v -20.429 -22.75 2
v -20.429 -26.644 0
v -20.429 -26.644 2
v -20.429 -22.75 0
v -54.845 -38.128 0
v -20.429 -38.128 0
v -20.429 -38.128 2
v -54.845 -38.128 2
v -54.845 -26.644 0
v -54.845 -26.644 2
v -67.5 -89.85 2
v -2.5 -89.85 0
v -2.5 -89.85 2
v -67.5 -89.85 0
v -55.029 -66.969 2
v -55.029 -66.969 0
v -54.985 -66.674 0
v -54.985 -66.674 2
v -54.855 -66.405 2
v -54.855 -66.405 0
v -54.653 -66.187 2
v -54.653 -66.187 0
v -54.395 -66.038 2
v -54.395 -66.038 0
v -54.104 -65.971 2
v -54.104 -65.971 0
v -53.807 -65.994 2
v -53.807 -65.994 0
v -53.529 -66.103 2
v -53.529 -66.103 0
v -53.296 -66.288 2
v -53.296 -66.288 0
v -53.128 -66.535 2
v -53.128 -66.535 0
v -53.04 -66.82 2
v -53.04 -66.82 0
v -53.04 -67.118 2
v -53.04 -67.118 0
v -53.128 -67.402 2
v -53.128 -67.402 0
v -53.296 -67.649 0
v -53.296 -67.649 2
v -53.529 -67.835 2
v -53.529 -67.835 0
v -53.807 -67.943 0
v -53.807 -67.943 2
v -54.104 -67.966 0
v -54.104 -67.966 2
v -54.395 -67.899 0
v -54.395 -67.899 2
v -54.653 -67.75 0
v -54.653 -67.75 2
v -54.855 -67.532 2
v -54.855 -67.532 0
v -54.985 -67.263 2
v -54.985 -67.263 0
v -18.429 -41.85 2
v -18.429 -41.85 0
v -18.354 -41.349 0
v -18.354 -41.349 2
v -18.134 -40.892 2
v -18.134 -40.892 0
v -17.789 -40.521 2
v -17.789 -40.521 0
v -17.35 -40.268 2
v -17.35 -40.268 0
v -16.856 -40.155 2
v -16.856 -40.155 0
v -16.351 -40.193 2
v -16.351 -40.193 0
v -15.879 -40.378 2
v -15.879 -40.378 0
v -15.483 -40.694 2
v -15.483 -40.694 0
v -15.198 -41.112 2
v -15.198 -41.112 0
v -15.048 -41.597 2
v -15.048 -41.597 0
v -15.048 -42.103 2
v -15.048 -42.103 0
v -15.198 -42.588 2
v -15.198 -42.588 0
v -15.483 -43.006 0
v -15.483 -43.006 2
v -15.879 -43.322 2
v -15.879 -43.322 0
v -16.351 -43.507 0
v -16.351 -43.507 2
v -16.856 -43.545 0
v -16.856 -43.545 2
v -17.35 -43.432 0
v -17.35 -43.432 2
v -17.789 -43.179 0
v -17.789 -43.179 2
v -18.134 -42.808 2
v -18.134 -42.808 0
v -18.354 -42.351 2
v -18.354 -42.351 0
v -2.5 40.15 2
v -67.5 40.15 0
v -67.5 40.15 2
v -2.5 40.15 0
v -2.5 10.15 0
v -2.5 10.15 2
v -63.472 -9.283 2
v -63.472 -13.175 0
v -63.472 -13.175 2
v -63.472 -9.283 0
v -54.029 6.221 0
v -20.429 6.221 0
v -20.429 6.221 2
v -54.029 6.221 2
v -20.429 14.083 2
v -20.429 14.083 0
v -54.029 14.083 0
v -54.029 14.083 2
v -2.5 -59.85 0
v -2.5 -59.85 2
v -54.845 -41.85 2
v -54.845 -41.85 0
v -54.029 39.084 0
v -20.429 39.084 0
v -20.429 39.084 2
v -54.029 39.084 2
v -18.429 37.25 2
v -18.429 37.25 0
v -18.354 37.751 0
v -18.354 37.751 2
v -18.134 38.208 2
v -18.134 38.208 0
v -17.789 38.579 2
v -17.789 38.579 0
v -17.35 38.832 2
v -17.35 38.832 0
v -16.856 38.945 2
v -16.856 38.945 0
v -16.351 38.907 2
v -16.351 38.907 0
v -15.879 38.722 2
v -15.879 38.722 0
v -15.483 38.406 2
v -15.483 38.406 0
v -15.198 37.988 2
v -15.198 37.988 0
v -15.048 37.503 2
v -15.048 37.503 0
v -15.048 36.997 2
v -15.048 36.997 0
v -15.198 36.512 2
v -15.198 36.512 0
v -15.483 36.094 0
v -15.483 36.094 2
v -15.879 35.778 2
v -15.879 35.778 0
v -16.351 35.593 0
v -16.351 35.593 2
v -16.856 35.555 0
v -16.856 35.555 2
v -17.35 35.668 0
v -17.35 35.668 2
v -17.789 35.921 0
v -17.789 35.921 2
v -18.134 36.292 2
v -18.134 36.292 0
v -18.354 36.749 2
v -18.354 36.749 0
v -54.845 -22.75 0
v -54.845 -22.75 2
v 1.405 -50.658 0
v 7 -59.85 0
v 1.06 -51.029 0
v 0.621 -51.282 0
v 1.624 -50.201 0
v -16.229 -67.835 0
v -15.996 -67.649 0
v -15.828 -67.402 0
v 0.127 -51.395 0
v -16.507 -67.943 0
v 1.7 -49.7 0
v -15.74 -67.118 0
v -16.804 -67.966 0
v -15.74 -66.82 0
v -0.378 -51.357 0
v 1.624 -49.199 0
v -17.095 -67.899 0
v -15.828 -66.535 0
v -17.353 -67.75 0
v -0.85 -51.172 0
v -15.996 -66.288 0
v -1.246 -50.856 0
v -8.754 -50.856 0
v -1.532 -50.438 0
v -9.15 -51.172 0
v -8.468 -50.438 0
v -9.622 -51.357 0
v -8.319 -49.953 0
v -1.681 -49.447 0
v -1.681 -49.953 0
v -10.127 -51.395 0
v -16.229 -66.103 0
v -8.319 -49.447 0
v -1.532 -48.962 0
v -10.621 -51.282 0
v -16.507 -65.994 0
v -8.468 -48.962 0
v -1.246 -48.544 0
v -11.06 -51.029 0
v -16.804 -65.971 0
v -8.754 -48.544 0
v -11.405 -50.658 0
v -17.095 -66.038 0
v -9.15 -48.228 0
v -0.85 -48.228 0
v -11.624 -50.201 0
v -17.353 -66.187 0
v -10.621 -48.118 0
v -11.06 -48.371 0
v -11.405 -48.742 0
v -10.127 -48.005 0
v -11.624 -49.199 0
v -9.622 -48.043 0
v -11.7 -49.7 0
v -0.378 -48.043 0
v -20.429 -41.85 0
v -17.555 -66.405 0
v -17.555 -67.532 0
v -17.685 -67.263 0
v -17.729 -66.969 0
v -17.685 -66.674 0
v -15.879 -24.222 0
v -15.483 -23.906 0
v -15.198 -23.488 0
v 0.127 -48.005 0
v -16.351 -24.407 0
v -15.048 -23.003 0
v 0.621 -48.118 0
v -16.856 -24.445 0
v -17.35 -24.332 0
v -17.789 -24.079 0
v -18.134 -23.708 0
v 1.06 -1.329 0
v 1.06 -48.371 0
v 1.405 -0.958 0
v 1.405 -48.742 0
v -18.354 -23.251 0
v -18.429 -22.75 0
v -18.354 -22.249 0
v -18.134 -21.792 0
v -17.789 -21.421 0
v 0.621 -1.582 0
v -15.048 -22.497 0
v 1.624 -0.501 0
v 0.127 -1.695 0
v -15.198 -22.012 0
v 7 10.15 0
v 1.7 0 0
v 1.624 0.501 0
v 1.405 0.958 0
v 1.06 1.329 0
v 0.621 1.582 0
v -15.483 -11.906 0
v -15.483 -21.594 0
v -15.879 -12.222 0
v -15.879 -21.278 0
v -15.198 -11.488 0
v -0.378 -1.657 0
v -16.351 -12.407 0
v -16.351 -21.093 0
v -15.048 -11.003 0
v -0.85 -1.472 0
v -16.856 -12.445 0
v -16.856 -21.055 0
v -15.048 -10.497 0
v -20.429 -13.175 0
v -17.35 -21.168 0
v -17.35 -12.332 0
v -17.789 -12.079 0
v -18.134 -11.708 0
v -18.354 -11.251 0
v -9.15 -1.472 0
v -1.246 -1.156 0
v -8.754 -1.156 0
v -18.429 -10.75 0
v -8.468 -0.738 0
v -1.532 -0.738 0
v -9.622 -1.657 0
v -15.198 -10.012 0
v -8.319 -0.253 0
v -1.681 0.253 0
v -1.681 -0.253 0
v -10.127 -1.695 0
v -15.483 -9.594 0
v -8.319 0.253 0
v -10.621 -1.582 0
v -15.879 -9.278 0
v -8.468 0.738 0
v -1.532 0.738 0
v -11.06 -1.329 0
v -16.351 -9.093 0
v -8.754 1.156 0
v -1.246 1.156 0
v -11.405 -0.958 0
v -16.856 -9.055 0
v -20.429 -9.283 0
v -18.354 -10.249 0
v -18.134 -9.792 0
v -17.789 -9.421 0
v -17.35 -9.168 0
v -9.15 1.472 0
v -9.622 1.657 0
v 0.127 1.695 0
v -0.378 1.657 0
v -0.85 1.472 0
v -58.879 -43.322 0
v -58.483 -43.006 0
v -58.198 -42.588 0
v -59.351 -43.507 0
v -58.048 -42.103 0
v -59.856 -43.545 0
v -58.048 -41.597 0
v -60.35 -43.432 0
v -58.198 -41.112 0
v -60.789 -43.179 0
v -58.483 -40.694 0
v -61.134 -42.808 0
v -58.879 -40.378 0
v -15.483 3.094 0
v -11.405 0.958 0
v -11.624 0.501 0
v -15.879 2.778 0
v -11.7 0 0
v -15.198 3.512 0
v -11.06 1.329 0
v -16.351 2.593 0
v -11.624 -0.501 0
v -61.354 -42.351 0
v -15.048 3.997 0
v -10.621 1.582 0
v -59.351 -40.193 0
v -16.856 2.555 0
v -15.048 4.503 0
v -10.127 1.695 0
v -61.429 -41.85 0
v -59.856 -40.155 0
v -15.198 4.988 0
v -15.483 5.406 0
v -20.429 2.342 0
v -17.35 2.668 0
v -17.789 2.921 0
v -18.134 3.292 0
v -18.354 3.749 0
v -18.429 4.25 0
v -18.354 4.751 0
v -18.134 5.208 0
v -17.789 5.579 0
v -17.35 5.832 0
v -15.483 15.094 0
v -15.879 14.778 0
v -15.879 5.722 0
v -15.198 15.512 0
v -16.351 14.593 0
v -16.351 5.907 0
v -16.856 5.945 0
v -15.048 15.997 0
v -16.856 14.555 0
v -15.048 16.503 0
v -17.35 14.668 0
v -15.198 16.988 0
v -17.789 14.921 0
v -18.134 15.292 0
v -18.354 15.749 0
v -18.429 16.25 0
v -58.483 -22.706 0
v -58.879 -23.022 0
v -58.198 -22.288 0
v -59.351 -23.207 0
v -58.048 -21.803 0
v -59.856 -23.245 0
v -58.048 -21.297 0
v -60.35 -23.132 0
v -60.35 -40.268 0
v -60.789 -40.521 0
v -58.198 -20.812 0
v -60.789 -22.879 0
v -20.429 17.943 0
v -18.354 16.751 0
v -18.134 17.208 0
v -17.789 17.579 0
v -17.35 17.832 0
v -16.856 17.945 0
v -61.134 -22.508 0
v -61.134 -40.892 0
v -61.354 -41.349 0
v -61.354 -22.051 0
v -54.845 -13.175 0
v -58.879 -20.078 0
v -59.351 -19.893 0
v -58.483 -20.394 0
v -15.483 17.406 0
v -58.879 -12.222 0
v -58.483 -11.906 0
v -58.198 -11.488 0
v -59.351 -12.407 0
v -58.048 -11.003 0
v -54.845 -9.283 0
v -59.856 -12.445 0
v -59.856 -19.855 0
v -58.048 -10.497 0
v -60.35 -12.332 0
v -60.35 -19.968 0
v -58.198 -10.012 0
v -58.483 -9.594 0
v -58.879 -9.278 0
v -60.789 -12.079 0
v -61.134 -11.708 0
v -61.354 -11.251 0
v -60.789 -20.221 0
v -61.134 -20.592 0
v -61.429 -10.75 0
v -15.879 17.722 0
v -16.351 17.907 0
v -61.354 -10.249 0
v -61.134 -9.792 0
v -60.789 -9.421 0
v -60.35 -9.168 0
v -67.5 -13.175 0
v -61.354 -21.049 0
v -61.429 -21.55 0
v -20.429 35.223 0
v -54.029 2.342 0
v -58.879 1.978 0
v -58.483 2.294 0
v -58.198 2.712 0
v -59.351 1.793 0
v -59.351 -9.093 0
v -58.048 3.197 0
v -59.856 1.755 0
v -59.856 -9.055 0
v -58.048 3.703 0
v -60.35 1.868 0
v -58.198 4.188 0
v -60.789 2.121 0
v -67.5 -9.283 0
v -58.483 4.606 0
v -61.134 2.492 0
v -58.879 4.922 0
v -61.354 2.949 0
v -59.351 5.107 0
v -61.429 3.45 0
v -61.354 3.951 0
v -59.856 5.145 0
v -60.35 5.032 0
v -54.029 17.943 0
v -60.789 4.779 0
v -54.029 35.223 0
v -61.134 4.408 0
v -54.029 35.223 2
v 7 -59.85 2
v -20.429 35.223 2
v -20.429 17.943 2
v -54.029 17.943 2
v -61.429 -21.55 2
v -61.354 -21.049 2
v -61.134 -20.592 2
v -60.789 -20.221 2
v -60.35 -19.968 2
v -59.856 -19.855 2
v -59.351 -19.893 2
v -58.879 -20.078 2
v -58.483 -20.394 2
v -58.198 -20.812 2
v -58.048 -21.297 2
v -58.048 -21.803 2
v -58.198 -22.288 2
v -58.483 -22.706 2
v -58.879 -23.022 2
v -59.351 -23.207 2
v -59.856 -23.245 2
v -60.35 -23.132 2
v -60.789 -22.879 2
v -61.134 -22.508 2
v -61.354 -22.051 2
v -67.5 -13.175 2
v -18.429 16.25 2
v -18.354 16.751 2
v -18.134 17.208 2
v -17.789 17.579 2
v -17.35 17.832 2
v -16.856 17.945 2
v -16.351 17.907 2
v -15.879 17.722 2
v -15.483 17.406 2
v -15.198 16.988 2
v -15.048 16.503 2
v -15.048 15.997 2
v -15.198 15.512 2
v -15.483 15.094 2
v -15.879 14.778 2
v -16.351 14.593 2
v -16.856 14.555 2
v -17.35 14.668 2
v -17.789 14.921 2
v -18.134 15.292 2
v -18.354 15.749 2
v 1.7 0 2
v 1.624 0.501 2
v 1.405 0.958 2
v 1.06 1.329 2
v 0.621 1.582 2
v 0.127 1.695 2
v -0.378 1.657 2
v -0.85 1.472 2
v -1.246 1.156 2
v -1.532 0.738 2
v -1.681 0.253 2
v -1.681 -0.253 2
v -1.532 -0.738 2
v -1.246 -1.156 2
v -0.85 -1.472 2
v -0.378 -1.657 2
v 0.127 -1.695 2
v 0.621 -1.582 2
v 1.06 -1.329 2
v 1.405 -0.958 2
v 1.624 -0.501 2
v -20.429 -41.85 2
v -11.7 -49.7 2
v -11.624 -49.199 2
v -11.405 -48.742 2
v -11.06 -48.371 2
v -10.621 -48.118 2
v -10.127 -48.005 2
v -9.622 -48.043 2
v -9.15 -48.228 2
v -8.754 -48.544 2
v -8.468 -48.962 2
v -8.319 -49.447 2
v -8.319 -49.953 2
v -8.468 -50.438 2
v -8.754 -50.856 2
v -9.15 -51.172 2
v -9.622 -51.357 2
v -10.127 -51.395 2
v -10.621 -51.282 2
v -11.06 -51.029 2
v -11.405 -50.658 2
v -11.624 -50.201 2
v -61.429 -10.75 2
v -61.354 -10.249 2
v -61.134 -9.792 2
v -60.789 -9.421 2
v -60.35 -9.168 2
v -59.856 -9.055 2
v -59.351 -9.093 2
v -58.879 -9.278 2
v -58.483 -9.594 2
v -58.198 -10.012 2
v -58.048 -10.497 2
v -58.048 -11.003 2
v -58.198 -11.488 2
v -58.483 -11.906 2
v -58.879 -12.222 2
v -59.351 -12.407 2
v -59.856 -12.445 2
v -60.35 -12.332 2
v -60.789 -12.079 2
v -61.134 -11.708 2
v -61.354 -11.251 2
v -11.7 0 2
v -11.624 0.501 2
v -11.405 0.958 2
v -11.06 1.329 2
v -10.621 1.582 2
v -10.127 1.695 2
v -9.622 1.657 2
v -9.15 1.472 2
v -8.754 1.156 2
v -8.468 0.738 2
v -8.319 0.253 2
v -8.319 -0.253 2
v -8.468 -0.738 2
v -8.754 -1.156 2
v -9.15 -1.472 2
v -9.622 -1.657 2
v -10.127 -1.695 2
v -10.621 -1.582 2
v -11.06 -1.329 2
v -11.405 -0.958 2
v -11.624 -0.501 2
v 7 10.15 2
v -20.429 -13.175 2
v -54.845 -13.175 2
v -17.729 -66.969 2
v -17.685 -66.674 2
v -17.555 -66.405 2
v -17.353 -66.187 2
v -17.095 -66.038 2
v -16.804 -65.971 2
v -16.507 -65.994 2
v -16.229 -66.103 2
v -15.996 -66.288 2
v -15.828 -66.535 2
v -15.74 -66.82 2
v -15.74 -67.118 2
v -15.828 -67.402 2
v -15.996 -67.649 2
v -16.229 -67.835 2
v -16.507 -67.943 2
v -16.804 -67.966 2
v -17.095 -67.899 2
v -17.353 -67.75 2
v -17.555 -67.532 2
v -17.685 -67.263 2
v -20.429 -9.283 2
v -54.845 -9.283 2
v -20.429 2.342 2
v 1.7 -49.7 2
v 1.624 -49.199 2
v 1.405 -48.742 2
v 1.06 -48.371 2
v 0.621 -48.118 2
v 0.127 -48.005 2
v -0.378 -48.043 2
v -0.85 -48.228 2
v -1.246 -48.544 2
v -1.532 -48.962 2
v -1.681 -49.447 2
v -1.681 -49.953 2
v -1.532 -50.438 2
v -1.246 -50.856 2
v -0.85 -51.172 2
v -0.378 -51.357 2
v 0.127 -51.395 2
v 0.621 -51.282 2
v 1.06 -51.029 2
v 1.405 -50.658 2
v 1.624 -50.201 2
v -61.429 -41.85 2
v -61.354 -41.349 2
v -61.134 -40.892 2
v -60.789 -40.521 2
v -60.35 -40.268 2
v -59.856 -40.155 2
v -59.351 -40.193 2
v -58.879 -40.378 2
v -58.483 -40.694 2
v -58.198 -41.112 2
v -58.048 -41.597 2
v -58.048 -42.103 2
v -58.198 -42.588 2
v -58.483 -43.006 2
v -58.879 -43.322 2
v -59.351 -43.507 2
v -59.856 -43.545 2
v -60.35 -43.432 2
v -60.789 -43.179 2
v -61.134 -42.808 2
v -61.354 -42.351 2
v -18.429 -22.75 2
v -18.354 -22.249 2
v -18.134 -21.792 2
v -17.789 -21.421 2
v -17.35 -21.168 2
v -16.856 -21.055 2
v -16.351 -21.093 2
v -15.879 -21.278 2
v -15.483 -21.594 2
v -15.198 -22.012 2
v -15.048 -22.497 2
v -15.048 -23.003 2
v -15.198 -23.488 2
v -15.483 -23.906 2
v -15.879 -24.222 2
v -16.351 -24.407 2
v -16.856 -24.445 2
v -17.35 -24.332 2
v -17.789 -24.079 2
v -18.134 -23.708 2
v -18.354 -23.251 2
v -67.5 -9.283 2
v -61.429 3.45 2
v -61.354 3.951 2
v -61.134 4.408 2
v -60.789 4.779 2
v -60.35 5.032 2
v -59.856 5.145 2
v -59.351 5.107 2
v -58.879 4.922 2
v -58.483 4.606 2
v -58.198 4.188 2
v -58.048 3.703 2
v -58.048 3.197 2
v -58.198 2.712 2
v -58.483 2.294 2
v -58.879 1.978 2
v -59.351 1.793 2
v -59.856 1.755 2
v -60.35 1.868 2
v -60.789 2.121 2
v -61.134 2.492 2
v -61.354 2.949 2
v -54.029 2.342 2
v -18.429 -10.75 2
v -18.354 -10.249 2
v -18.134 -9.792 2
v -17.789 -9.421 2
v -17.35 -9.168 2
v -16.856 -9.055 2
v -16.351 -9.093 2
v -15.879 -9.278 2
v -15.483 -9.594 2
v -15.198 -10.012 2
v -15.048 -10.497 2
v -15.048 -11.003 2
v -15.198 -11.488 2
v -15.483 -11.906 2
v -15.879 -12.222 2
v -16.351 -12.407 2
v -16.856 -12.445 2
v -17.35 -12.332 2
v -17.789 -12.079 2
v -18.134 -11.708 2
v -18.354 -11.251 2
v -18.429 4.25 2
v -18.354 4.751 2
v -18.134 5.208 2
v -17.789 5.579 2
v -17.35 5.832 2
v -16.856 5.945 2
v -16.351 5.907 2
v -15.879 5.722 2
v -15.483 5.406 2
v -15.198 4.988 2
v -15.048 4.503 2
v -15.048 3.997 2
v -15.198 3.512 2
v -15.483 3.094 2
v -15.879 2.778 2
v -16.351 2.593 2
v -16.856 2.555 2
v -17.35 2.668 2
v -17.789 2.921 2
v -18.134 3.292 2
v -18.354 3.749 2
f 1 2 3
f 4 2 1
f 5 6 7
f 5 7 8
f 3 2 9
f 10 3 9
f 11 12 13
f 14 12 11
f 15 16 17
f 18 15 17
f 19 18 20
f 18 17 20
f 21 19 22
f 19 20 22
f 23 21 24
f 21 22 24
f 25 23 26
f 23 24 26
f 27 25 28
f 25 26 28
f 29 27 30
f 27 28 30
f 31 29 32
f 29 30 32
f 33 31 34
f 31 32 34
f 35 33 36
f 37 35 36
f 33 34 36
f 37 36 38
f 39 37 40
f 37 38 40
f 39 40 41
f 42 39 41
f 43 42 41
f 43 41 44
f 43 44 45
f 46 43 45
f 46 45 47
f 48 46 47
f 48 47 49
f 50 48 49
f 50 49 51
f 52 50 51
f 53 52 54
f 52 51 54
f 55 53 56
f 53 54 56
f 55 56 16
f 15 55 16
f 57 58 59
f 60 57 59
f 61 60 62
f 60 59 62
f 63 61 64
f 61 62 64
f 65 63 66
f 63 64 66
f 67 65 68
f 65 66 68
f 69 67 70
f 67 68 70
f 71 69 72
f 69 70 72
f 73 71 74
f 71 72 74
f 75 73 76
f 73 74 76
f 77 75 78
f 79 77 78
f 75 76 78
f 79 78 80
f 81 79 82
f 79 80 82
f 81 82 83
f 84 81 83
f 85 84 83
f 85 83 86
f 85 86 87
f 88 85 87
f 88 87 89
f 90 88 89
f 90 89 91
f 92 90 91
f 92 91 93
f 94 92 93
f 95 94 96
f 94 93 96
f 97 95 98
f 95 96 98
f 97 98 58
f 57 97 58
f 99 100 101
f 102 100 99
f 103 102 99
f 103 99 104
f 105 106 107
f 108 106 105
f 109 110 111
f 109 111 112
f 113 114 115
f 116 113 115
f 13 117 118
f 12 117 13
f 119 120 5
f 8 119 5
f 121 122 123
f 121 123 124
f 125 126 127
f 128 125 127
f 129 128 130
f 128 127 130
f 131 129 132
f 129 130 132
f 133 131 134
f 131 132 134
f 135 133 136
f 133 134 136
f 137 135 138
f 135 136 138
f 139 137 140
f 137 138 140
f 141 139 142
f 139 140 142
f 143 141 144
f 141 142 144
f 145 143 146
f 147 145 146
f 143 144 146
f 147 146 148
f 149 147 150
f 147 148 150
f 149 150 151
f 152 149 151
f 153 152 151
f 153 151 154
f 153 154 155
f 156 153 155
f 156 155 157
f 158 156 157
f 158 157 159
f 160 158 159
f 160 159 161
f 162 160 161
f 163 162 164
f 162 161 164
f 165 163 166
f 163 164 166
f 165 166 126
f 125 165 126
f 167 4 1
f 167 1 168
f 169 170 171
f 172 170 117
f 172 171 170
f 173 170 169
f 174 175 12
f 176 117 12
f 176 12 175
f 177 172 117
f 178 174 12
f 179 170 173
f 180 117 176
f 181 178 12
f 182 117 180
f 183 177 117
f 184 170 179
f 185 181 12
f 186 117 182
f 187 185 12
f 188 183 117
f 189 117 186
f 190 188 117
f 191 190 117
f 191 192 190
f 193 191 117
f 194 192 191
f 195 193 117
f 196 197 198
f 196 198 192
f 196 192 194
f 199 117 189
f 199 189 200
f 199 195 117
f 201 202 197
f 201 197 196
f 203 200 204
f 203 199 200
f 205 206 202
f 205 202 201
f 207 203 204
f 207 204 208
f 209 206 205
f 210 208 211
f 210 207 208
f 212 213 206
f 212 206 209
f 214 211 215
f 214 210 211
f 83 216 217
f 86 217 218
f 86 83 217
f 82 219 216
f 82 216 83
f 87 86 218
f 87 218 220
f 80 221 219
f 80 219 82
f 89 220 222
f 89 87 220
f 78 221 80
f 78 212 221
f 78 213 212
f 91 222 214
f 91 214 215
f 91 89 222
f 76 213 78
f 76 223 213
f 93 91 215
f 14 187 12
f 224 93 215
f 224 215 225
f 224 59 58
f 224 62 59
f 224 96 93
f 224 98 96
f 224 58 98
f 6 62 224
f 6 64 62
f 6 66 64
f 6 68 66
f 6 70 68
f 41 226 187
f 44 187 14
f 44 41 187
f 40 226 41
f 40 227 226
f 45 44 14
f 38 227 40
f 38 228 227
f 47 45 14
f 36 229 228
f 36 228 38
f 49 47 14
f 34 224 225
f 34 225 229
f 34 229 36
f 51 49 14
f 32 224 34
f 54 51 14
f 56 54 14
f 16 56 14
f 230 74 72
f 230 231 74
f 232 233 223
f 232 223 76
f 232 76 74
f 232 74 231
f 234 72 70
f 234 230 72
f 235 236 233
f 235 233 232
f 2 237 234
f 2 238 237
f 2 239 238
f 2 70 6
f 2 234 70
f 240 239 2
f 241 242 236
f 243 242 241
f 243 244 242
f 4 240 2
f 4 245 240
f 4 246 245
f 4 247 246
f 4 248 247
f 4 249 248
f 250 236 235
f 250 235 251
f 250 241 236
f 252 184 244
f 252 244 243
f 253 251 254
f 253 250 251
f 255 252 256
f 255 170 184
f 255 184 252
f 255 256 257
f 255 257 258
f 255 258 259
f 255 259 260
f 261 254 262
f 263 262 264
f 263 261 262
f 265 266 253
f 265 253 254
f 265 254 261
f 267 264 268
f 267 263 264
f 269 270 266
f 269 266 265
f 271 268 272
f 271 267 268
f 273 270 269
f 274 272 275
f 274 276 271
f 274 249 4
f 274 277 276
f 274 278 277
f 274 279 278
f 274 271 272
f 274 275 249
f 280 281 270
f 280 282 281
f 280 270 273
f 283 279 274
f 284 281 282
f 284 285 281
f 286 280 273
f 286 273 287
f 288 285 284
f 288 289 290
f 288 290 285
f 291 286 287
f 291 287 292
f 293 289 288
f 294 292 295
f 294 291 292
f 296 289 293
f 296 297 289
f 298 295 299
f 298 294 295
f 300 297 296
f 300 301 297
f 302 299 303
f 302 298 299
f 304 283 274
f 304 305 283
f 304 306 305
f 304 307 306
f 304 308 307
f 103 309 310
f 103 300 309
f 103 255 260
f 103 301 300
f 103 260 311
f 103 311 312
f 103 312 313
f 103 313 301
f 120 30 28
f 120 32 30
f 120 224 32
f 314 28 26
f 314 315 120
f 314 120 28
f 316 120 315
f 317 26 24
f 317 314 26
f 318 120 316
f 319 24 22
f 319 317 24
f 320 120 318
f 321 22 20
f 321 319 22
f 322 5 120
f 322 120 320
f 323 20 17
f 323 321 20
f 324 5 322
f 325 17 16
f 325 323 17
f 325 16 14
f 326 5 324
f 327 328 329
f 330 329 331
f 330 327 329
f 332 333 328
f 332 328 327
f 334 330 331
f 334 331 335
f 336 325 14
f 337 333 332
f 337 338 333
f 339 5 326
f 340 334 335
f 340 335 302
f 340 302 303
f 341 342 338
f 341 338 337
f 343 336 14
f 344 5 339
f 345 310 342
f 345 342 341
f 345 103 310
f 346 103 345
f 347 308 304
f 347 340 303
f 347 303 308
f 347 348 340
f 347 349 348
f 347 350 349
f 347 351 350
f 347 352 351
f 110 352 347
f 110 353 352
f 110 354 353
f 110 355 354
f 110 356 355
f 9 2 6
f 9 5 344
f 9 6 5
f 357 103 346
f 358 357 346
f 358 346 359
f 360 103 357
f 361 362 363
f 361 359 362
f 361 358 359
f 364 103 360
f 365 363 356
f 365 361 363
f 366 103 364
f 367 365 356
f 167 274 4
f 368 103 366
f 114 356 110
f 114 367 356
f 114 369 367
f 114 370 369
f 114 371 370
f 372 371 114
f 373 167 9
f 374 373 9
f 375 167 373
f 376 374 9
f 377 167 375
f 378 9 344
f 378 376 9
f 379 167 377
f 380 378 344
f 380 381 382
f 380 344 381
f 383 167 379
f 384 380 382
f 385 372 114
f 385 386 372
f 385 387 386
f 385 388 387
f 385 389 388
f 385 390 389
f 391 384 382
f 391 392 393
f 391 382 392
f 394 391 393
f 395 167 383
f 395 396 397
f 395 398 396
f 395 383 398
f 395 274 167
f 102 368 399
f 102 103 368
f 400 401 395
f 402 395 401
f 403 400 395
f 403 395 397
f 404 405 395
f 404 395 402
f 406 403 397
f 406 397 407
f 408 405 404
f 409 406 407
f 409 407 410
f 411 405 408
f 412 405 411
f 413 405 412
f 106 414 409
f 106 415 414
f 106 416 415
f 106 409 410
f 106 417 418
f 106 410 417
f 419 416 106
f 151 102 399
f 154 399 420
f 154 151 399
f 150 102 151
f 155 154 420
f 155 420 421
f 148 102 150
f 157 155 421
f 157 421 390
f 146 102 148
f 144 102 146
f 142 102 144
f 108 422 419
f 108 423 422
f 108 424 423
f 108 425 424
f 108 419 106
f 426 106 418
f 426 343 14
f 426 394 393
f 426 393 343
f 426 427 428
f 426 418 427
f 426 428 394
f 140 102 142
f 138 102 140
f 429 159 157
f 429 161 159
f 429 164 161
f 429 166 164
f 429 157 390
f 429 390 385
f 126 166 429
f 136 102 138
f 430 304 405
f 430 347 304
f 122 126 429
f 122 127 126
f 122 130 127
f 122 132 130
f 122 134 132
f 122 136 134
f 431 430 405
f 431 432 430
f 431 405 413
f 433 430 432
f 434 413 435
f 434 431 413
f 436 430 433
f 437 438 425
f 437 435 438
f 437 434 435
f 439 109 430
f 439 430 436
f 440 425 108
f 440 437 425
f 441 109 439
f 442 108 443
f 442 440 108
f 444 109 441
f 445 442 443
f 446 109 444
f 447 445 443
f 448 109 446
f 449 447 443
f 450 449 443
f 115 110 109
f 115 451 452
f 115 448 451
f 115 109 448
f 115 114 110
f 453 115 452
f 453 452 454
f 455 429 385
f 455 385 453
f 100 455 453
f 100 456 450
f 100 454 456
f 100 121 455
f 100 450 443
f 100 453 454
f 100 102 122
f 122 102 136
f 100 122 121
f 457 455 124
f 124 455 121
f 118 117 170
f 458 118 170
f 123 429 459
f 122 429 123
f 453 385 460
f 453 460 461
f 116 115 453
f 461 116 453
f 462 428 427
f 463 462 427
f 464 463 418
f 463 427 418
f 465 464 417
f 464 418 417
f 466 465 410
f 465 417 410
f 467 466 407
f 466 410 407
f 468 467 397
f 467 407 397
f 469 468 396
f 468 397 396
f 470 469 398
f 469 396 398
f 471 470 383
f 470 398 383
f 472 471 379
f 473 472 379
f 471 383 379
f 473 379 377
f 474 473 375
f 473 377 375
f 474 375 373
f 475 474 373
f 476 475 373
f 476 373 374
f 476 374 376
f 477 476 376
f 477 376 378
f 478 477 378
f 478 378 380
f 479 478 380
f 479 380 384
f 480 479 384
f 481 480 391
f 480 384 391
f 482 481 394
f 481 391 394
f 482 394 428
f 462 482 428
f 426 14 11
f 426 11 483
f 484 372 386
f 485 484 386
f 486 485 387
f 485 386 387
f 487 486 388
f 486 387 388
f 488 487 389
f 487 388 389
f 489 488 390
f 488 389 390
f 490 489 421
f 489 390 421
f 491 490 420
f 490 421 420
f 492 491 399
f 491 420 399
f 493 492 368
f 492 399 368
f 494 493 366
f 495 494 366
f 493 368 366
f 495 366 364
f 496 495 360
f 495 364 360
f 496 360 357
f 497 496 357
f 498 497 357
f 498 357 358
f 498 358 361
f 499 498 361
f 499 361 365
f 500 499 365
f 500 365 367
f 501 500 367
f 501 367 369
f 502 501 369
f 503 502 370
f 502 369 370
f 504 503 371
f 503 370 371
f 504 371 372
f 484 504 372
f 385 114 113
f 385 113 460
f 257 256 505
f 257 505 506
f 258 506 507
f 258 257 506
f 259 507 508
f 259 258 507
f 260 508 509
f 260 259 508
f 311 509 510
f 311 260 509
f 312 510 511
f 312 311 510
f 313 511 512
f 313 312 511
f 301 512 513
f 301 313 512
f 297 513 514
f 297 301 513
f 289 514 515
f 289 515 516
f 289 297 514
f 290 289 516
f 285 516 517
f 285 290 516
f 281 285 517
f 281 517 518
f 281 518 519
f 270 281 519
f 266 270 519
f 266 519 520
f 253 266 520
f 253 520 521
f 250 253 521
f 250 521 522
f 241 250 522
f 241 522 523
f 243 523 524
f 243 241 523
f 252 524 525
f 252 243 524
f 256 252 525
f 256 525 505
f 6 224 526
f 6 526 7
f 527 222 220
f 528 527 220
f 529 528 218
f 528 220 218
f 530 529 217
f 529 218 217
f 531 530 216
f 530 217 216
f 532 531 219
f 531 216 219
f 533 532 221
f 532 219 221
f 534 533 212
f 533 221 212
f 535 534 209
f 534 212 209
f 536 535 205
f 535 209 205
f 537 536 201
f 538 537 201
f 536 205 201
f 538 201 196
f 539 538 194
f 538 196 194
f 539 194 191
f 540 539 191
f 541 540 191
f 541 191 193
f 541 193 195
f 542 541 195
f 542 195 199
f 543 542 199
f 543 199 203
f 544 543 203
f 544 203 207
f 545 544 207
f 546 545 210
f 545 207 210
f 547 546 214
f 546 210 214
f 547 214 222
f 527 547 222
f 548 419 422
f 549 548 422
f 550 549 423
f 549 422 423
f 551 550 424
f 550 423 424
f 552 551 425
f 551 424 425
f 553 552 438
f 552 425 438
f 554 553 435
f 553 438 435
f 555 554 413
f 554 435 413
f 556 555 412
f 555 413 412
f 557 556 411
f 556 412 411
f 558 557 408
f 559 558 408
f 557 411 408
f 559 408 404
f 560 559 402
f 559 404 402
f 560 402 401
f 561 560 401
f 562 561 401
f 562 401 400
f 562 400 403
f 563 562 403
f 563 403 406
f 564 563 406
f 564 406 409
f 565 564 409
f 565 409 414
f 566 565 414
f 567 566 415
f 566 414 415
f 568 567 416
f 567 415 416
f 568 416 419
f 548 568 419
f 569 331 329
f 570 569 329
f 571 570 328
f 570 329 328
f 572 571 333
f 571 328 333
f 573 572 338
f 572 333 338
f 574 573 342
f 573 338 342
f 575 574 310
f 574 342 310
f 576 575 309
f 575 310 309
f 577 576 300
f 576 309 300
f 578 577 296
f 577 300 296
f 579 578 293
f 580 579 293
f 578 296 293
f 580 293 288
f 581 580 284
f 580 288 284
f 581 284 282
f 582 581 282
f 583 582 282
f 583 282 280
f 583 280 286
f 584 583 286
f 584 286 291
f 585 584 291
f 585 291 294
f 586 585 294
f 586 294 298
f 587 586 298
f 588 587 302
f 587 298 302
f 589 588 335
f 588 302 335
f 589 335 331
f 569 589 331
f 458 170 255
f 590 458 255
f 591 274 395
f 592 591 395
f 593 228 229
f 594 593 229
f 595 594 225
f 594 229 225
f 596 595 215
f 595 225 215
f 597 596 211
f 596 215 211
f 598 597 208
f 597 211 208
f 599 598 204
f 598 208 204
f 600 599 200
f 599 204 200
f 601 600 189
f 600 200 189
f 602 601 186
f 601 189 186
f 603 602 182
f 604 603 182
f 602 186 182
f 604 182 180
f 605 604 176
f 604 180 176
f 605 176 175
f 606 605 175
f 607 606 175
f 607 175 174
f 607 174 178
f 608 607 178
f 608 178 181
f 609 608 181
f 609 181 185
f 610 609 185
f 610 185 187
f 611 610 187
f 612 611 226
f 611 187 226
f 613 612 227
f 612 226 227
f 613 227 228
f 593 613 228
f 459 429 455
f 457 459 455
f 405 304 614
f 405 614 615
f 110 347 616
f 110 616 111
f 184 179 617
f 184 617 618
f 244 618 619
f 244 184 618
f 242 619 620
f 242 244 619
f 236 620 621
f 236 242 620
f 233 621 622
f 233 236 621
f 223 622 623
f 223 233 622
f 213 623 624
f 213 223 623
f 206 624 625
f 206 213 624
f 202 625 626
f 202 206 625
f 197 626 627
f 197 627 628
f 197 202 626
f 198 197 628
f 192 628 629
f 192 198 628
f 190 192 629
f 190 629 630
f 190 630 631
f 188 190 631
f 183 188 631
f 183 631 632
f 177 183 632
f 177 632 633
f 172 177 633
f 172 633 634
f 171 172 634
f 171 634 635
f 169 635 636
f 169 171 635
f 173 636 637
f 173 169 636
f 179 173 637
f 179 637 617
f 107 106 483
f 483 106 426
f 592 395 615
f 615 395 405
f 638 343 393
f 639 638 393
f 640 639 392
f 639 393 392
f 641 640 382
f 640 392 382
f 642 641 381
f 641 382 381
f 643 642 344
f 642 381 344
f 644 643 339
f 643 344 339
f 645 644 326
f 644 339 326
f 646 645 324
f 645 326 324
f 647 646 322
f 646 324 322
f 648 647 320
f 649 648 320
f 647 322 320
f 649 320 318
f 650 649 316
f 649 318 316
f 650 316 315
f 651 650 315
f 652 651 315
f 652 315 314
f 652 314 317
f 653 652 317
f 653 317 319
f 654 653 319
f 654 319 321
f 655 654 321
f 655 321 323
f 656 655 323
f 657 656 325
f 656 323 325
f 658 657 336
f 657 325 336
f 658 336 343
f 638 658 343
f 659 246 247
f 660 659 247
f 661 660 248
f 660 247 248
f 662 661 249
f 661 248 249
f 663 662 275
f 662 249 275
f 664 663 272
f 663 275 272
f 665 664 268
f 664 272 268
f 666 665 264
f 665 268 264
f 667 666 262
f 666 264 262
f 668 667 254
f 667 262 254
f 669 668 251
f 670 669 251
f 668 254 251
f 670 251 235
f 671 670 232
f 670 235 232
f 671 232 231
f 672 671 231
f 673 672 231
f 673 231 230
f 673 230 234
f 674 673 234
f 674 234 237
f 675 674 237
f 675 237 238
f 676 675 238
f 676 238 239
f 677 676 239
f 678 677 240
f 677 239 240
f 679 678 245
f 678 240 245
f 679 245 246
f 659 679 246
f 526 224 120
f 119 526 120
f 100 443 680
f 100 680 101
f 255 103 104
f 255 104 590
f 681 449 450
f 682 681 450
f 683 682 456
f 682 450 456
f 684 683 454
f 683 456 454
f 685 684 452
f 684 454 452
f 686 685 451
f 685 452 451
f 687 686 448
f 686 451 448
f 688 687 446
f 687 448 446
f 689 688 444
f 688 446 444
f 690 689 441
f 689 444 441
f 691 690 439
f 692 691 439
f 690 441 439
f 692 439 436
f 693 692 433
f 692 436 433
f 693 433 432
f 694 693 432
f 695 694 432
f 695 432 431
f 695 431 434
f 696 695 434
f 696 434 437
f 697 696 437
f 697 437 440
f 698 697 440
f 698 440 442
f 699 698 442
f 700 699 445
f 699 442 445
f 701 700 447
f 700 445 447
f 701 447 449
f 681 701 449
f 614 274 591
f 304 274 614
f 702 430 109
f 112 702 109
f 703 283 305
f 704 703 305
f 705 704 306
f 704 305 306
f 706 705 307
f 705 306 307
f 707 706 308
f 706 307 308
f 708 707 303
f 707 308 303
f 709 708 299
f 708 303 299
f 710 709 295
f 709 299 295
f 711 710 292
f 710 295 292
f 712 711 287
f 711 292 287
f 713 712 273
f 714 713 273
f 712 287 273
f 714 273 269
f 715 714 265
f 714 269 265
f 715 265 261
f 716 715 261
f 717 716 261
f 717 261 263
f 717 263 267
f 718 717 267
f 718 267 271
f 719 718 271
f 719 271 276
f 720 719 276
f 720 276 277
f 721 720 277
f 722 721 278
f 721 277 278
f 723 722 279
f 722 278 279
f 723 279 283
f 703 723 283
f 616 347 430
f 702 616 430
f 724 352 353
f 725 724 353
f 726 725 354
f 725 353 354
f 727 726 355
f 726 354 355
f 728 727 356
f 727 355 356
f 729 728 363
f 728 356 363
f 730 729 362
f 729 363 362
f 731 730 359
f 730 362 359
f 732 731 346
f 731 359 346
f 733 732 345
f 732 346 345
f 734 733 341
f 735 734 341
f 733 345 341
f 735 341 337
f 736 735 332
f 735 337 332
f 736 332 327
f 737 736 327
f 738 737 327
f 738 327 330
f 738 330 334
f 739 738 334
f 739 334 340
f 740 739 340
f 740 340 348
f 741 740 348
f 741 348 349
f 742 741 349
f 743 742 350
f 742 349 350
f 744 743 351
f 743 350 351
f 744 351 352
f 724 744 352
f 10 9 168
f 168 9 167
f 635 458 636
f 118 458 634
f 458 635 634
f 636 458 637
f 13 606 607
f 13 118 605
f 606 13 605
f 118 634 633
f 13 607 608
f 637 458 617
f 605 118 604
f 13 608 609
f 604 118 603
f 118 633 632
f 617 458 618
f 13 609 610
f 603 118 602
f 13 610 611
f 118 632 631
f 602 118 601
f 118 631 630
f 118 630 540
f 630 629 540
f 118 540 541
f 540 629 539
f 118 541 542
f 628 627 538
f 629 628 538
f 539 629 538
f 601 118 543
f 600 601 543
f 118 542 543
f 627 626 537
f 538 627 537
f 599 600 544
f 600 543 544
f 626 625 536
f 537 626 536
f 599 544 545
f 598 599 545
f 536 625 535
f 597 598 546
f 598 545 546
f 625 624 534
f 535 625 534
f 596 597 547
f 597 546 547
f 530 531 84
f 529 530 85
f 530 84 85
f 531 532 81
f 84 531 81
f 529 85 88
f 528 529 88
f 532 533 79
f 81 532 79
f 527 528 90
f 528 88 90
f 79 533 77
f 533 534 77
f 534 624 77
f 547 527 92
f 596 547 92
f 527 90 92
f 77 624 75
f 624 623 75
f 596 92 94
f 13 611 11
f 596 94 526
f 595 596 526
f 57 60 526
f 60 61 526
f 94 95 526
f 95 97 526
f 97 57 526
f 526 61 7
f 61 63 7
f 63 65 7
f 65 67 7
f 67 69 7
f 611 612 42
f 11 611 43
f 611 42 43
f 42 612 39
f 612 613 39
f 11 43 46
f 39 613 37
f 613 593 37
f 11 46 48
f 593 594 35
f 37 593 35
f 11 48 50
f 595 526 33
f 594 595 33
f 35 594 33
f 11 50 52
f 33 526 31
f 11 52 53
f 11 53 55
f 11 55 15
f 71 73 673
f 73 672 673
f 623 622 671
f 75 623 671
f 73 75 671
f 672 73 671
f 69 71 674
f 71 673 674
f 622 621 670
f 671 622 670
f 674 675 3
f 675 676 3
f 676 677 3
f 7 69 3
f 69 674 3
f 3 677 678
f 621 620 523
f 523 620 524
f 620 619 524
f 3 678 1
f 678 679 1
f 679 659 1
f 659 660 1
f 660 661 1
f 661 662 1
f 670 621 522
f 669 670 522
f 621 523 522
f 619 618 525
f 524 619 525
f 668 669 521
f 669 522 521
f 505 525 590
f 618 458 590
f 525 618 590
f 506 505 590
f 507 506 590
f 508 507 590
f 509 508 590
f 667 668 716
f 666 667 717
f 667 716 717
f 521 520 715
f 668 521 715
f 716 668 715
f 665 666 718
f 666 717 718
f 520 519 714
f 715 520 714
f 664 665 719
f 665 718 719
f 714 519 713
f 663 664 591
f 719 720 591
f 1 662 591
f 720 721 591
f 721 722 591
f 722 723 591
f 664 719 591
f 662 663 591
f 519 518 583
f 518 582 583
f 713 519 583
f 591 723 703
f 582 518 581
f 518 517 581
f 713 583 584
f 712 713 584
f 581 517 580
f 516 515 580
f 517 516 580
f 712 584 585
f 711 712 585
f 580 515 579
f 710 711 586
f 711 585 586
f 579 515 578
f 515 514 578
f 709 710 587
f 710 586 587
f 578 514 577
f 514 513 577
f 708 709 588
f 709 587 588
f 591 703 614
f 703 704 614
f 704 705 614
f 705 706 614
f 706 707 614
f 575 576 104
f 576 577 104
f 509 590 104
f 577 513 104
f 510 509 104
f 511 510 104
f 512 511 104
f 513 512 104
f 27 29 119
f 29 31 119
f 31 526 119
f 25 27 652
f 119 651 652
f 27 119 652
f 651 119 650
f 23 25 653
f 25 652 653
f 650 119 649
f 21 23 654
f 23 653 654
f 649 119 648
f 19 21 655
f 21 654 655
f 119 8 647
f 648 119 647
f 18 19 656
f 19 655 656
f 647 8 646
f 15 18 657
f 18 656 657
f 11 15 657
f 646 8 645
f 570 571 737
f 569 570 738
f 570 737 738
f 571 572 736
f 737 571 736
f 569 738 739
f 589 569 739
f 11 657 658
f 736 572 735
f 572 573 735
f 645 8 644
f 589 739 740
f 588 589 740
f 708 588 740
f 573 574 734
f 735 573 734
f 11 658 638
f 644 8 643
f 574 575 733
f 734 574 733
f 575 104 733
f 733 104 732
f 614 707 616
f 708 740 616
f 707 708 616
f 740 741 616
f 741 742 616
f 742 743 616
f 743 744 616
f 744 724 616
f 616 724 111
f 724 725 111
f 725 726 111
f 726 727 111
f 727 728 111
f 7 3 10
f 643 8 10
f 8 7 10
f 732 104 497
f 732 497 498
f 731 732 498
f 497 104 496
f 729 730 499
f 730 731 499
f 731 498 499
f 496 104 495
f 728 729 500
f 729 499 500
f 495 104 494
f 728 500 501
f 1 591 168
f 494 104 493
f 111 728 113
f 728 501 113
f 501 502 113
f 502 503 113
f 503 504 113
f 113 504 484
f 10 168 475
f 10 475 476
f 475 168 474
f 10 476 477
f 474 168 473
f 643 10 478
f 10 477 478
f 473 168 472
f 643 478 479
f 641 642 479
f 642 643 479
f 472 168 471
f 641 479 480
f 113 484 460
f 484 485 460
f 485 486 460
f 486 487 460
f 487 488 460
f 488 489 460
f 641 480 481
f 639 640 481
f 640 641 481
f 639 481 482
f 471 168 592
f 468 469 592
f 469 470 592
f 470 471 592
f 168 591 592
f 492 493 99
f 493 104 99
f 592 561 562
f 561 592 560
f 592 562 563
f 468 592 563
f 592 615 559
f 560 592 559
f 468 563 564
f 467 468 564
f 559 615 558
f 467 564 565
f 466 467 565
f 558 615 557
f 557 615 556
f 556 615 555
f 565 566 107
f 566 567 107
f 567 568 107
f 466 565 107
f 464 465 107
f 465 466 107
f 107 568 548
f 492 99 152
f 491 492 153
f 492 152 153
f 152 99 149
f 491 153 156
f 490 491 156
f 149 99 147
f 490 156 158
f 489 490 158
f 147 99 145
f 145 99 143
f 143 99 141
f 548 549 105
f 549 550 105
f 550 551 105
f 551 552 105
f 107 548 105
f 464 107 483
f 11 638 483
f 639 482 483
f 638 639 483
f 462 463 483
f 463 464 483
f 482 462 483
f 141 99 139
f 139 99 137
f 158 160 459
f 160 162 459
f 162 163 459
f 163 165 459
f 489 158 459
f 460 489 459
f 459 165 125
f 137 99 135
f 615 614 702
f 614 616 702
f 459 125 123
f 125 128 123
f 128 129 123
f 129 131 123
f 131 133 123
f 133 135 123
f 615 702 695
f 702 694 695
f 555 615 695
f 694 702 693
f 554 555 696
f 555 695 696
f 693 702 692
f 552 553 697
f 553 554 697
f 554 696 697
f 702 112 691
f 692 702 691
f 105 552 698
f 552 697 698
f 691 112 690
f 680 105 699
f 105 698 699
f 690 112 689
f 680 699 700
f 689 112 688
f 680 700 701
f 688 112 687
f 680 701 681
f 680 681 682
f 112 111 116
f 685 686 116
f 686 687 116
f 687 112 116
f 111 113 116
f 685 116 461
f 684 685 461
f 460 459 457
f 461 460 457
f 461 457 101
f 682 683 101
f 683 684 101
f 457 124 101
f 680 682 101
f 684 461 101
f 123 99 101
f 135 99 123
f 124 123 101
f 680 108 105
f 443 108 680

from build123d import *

# Parameters (mm, degrees)
ESQUISSE1_W             = 19
ESQUISSE1_H             = 70
ESQUISSE1_R             = 1.7
BOSS_EXTRU_1_DEPTH      = 2
BOSS_EXTRU_2_DEPTH      = 2
ESQUISSE3_R             = 1.7
ESQUISSE3_R_2           = 1
ESQUISSE3_W             = 34.416616224
ESQUISSE3_H             = 3.721706088
ESQUISSE3_H_2           = 3.894041755
ESQUISSE3_H_3           = 3.892627661
ESQUISSE3_W_2           = 33.600664609
ESQUISSE3_H_4           = 3.878874163
ESQUISSE3_H_5           = 3.860536167
ESQUISSE3_H_6           = 3.860536168
ESQUISSE3_W_3           = 4.02824374
ENL_V_MAT_EXTRU_1_DEPTH = 2
ESQUISSE4_R             = 1.7
ENL_V_MAT_EXTRU_2_DEPTH = 2


with BuildPart() as part:
    # Esquisse1 → Boss.-Extru.1 (new body)
    with BuildSketch(Plane.XY):
        with Locations((-2.5, -24.85)):
            Rectangle(ESQUISSE1_W, ESQUISSE1_H)
        Circle(ESQUISSE1_R, mode=Mode.SUBTRACT)
        with Locations((0, -49.7)):
            Circle(ESQUISSE1_R, mode=Mode.SUBTRACT)
    extrude(amount=BOSS_EXTRU_1_DEPTH)

    # Esquisse2 → Boss.-Extru.2 (add)
    with BuildSketch(Plane(origin=(0, 0, 0), x_dir=(-1, 0, 0), z_dir=(0, 0, -1))):
        Polygon((67.5, -22.717620887), (67.5, 40.15), (2.5, 40.15), (2.5, -89.85), (67.5, -89.85), (67.5, -26.982379113), align=None)
    extrude(amount=-BOSS_EXTRU_2_DEPTH)

    # Esquisse3 → Enlèv. mat.-Extru.1 (cut)
    with BuildSketch(Plane(origin=(0, 0, 0), x_dir=(-1, 0, 0), z_dir=(0, 0, -1))):
        with Locations((16.729252348, -41.85)):
            Circle(ESQUISSE3_R)
        with Locations((16.729252348, -66.968565228)):
            Circle(ESQUISSE3_R_2)
        with Locations((54.029252348, -66.968565228)):
            Circle(ESQUISSE3_R_2)
        with Locations((16.729252348, -22.75)):
            Circle(ESQUISSE3_R)
        with Locations((16.729252348, -10.75)):
            Circle(ESQUISSE3_R)
        with Locations((16.729252348, 4.25)):
            Circle(ESQUISSE3_R)
        with Locations((16.729252348, 16.25)):
            Circle(ESQUISSE3_R)
        with Locations((16.729252348, 37.25)):
            Circle(ESQUISSE3_R)
        with Locations((59.729252348, -41.85)):
            Circle(ESQUISSE3_R)
        with Locations((59.729252348, -21.55)):
            Circle(ESQUISSE3_R)
        with Locations((59.729252348, -10.75)):
            Circle(ESQUISSE3_R)
        with Locations((59.729252348, 3.45)):
            Circle(ESQUISSE3_R)
        with Locations((37.636895851, -39.989146956)):
            Rectangle(ESQUISSE3_W, ESQUISSE3_H)
        with Locations((37.636895851, -24.697020878)):
            Rectangle(ESQUISSE3_W, ESQUISSE3_H_2)
        with Locations((37.636895851, -11.228994179)):
            Rectangle(ESQUISSE3_W, ESQUISSE3_H_3)
        with Locations((37.228920043, 4.281571073)):
            Rectangle(ESQUISSE3_W_2, ESQUISSE3_H_4)
        with Locations((37.228920043, 16.012867078)):
            Rectangle(ESQUISSE3_W_2, ESQUISSE3_H_5)
        with Locations((37.228920043, 37.153497731)):
            Rectangle(ESQUISSE3_W_2, ESQUISSE3_H_6)
        with Locations((65.48587813, -11.228994179)):
            Rectangle(ESQUISSE3_W_3, ESQUISSE3_H_3)
    extrude(amount=-ENL_V_MAT_EXTRU_1_DEPTH, mode=Mode.SUBTRACT)

    # Esquisse4 → Enlèv. mat.-Extru.2 (cut)
    with BuildSketch(Plane(origin=(0, 0, 0), x_dir=(-1, 0, 0), z_dir=(0, 0, -1))):
        with Locations((10, -49.7)):
            Circle(ESQUISSE4_R)
        with Locations((10, 0)):
            Circle(ESQUISSE4_R)
    extrude(amount=-ENL_V_MAT_EXTRU_2_DEPTH, mode=Mode.SUBTRACT)


solid = part.part
